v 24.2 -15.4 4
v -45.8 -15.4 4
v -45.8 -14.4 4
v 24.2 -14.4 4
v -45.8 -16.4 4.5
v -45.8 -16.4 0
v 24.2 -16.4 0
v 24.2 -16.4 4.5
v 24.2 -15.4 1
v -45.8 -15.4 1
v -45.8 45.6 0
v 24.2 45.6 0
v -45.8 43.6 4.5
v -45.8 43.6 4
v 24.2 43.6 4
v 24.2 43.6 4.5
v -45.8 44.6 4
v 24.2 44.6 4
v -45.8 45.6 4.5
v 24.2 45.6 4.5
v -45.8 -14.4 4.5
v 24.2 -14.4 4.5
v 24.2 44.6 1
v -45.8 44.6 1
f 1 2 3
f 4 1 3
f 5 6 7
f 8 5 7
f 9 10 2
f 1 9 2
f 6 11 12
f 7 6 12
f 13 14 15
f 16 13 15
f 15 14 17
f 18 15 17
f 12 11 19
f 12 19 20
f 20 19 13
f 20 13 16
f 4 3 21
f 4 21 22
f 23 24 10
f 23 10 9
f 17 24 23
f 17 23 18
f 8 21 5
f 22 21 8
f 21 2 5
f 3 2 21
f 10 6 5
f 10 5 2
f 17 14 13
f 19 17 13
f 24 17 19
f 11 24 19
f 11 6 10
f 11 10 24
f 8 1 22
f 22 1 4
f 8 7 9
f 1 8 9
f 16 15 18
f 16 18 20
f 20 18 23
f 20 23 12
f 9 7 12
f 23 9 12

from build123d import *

# Parameters (mm, degrees)
SKETCH_1_W          = 70
SKETCH_1_H          = 62
EXTRUDE_1_DEPTH     = 1
SKETCH_2_W          = 70
SKETCH_2_H          = 2
EXTRUDE_2_DEPTH     = 3.5
SKETCH_6_W          = 3
SKETCH_6_H          = 1
CUT_EXTRUDE_1_DEPTH = 71


with BuildPart() as part:
    # 草图1 → 凸台-拉伸1 (new body)
    with BuildSketch(Plane.XY):
        with Locations((-10.8, 14.6)):
            Rectangle(SKETCH_1_W, SKETCH_1_H)
    extrude(amount=EXTRUDE_1_DEPTH)

    # 草图2 → 凸台-拉伸2 (add)
    with BuildSketch(Plane.XY.offset(1)):
        with Locations((-10.8, 44.6)):
            Rectangle(SKETCH_2_W, SKETCH_2_H)
        with Locations((-10.8, -15.4)):
            Rectangle(SKETCH_2_W, SKETCH_2_H)
    extrude(amount=EXTRUDE_2_DEPTH)

    # 草图6 → 切除-拉伸1 (cut, through all)
    with BuildSketch(Plane.ZY.offset(45.8)):
        with Locations((2.5, 44.1)):
            Rectangle(SKETCH_6_W, SKETCH_6_H)
        with Locations((2.5, -14.9)):
            Rectangle(SKETCH_6_W, SKETCH_6_H)
    extrude(amount=-CUT_EXTRUDE_1_DEPTH, mode=Mode.SUBTRACT)


solid = part.part
